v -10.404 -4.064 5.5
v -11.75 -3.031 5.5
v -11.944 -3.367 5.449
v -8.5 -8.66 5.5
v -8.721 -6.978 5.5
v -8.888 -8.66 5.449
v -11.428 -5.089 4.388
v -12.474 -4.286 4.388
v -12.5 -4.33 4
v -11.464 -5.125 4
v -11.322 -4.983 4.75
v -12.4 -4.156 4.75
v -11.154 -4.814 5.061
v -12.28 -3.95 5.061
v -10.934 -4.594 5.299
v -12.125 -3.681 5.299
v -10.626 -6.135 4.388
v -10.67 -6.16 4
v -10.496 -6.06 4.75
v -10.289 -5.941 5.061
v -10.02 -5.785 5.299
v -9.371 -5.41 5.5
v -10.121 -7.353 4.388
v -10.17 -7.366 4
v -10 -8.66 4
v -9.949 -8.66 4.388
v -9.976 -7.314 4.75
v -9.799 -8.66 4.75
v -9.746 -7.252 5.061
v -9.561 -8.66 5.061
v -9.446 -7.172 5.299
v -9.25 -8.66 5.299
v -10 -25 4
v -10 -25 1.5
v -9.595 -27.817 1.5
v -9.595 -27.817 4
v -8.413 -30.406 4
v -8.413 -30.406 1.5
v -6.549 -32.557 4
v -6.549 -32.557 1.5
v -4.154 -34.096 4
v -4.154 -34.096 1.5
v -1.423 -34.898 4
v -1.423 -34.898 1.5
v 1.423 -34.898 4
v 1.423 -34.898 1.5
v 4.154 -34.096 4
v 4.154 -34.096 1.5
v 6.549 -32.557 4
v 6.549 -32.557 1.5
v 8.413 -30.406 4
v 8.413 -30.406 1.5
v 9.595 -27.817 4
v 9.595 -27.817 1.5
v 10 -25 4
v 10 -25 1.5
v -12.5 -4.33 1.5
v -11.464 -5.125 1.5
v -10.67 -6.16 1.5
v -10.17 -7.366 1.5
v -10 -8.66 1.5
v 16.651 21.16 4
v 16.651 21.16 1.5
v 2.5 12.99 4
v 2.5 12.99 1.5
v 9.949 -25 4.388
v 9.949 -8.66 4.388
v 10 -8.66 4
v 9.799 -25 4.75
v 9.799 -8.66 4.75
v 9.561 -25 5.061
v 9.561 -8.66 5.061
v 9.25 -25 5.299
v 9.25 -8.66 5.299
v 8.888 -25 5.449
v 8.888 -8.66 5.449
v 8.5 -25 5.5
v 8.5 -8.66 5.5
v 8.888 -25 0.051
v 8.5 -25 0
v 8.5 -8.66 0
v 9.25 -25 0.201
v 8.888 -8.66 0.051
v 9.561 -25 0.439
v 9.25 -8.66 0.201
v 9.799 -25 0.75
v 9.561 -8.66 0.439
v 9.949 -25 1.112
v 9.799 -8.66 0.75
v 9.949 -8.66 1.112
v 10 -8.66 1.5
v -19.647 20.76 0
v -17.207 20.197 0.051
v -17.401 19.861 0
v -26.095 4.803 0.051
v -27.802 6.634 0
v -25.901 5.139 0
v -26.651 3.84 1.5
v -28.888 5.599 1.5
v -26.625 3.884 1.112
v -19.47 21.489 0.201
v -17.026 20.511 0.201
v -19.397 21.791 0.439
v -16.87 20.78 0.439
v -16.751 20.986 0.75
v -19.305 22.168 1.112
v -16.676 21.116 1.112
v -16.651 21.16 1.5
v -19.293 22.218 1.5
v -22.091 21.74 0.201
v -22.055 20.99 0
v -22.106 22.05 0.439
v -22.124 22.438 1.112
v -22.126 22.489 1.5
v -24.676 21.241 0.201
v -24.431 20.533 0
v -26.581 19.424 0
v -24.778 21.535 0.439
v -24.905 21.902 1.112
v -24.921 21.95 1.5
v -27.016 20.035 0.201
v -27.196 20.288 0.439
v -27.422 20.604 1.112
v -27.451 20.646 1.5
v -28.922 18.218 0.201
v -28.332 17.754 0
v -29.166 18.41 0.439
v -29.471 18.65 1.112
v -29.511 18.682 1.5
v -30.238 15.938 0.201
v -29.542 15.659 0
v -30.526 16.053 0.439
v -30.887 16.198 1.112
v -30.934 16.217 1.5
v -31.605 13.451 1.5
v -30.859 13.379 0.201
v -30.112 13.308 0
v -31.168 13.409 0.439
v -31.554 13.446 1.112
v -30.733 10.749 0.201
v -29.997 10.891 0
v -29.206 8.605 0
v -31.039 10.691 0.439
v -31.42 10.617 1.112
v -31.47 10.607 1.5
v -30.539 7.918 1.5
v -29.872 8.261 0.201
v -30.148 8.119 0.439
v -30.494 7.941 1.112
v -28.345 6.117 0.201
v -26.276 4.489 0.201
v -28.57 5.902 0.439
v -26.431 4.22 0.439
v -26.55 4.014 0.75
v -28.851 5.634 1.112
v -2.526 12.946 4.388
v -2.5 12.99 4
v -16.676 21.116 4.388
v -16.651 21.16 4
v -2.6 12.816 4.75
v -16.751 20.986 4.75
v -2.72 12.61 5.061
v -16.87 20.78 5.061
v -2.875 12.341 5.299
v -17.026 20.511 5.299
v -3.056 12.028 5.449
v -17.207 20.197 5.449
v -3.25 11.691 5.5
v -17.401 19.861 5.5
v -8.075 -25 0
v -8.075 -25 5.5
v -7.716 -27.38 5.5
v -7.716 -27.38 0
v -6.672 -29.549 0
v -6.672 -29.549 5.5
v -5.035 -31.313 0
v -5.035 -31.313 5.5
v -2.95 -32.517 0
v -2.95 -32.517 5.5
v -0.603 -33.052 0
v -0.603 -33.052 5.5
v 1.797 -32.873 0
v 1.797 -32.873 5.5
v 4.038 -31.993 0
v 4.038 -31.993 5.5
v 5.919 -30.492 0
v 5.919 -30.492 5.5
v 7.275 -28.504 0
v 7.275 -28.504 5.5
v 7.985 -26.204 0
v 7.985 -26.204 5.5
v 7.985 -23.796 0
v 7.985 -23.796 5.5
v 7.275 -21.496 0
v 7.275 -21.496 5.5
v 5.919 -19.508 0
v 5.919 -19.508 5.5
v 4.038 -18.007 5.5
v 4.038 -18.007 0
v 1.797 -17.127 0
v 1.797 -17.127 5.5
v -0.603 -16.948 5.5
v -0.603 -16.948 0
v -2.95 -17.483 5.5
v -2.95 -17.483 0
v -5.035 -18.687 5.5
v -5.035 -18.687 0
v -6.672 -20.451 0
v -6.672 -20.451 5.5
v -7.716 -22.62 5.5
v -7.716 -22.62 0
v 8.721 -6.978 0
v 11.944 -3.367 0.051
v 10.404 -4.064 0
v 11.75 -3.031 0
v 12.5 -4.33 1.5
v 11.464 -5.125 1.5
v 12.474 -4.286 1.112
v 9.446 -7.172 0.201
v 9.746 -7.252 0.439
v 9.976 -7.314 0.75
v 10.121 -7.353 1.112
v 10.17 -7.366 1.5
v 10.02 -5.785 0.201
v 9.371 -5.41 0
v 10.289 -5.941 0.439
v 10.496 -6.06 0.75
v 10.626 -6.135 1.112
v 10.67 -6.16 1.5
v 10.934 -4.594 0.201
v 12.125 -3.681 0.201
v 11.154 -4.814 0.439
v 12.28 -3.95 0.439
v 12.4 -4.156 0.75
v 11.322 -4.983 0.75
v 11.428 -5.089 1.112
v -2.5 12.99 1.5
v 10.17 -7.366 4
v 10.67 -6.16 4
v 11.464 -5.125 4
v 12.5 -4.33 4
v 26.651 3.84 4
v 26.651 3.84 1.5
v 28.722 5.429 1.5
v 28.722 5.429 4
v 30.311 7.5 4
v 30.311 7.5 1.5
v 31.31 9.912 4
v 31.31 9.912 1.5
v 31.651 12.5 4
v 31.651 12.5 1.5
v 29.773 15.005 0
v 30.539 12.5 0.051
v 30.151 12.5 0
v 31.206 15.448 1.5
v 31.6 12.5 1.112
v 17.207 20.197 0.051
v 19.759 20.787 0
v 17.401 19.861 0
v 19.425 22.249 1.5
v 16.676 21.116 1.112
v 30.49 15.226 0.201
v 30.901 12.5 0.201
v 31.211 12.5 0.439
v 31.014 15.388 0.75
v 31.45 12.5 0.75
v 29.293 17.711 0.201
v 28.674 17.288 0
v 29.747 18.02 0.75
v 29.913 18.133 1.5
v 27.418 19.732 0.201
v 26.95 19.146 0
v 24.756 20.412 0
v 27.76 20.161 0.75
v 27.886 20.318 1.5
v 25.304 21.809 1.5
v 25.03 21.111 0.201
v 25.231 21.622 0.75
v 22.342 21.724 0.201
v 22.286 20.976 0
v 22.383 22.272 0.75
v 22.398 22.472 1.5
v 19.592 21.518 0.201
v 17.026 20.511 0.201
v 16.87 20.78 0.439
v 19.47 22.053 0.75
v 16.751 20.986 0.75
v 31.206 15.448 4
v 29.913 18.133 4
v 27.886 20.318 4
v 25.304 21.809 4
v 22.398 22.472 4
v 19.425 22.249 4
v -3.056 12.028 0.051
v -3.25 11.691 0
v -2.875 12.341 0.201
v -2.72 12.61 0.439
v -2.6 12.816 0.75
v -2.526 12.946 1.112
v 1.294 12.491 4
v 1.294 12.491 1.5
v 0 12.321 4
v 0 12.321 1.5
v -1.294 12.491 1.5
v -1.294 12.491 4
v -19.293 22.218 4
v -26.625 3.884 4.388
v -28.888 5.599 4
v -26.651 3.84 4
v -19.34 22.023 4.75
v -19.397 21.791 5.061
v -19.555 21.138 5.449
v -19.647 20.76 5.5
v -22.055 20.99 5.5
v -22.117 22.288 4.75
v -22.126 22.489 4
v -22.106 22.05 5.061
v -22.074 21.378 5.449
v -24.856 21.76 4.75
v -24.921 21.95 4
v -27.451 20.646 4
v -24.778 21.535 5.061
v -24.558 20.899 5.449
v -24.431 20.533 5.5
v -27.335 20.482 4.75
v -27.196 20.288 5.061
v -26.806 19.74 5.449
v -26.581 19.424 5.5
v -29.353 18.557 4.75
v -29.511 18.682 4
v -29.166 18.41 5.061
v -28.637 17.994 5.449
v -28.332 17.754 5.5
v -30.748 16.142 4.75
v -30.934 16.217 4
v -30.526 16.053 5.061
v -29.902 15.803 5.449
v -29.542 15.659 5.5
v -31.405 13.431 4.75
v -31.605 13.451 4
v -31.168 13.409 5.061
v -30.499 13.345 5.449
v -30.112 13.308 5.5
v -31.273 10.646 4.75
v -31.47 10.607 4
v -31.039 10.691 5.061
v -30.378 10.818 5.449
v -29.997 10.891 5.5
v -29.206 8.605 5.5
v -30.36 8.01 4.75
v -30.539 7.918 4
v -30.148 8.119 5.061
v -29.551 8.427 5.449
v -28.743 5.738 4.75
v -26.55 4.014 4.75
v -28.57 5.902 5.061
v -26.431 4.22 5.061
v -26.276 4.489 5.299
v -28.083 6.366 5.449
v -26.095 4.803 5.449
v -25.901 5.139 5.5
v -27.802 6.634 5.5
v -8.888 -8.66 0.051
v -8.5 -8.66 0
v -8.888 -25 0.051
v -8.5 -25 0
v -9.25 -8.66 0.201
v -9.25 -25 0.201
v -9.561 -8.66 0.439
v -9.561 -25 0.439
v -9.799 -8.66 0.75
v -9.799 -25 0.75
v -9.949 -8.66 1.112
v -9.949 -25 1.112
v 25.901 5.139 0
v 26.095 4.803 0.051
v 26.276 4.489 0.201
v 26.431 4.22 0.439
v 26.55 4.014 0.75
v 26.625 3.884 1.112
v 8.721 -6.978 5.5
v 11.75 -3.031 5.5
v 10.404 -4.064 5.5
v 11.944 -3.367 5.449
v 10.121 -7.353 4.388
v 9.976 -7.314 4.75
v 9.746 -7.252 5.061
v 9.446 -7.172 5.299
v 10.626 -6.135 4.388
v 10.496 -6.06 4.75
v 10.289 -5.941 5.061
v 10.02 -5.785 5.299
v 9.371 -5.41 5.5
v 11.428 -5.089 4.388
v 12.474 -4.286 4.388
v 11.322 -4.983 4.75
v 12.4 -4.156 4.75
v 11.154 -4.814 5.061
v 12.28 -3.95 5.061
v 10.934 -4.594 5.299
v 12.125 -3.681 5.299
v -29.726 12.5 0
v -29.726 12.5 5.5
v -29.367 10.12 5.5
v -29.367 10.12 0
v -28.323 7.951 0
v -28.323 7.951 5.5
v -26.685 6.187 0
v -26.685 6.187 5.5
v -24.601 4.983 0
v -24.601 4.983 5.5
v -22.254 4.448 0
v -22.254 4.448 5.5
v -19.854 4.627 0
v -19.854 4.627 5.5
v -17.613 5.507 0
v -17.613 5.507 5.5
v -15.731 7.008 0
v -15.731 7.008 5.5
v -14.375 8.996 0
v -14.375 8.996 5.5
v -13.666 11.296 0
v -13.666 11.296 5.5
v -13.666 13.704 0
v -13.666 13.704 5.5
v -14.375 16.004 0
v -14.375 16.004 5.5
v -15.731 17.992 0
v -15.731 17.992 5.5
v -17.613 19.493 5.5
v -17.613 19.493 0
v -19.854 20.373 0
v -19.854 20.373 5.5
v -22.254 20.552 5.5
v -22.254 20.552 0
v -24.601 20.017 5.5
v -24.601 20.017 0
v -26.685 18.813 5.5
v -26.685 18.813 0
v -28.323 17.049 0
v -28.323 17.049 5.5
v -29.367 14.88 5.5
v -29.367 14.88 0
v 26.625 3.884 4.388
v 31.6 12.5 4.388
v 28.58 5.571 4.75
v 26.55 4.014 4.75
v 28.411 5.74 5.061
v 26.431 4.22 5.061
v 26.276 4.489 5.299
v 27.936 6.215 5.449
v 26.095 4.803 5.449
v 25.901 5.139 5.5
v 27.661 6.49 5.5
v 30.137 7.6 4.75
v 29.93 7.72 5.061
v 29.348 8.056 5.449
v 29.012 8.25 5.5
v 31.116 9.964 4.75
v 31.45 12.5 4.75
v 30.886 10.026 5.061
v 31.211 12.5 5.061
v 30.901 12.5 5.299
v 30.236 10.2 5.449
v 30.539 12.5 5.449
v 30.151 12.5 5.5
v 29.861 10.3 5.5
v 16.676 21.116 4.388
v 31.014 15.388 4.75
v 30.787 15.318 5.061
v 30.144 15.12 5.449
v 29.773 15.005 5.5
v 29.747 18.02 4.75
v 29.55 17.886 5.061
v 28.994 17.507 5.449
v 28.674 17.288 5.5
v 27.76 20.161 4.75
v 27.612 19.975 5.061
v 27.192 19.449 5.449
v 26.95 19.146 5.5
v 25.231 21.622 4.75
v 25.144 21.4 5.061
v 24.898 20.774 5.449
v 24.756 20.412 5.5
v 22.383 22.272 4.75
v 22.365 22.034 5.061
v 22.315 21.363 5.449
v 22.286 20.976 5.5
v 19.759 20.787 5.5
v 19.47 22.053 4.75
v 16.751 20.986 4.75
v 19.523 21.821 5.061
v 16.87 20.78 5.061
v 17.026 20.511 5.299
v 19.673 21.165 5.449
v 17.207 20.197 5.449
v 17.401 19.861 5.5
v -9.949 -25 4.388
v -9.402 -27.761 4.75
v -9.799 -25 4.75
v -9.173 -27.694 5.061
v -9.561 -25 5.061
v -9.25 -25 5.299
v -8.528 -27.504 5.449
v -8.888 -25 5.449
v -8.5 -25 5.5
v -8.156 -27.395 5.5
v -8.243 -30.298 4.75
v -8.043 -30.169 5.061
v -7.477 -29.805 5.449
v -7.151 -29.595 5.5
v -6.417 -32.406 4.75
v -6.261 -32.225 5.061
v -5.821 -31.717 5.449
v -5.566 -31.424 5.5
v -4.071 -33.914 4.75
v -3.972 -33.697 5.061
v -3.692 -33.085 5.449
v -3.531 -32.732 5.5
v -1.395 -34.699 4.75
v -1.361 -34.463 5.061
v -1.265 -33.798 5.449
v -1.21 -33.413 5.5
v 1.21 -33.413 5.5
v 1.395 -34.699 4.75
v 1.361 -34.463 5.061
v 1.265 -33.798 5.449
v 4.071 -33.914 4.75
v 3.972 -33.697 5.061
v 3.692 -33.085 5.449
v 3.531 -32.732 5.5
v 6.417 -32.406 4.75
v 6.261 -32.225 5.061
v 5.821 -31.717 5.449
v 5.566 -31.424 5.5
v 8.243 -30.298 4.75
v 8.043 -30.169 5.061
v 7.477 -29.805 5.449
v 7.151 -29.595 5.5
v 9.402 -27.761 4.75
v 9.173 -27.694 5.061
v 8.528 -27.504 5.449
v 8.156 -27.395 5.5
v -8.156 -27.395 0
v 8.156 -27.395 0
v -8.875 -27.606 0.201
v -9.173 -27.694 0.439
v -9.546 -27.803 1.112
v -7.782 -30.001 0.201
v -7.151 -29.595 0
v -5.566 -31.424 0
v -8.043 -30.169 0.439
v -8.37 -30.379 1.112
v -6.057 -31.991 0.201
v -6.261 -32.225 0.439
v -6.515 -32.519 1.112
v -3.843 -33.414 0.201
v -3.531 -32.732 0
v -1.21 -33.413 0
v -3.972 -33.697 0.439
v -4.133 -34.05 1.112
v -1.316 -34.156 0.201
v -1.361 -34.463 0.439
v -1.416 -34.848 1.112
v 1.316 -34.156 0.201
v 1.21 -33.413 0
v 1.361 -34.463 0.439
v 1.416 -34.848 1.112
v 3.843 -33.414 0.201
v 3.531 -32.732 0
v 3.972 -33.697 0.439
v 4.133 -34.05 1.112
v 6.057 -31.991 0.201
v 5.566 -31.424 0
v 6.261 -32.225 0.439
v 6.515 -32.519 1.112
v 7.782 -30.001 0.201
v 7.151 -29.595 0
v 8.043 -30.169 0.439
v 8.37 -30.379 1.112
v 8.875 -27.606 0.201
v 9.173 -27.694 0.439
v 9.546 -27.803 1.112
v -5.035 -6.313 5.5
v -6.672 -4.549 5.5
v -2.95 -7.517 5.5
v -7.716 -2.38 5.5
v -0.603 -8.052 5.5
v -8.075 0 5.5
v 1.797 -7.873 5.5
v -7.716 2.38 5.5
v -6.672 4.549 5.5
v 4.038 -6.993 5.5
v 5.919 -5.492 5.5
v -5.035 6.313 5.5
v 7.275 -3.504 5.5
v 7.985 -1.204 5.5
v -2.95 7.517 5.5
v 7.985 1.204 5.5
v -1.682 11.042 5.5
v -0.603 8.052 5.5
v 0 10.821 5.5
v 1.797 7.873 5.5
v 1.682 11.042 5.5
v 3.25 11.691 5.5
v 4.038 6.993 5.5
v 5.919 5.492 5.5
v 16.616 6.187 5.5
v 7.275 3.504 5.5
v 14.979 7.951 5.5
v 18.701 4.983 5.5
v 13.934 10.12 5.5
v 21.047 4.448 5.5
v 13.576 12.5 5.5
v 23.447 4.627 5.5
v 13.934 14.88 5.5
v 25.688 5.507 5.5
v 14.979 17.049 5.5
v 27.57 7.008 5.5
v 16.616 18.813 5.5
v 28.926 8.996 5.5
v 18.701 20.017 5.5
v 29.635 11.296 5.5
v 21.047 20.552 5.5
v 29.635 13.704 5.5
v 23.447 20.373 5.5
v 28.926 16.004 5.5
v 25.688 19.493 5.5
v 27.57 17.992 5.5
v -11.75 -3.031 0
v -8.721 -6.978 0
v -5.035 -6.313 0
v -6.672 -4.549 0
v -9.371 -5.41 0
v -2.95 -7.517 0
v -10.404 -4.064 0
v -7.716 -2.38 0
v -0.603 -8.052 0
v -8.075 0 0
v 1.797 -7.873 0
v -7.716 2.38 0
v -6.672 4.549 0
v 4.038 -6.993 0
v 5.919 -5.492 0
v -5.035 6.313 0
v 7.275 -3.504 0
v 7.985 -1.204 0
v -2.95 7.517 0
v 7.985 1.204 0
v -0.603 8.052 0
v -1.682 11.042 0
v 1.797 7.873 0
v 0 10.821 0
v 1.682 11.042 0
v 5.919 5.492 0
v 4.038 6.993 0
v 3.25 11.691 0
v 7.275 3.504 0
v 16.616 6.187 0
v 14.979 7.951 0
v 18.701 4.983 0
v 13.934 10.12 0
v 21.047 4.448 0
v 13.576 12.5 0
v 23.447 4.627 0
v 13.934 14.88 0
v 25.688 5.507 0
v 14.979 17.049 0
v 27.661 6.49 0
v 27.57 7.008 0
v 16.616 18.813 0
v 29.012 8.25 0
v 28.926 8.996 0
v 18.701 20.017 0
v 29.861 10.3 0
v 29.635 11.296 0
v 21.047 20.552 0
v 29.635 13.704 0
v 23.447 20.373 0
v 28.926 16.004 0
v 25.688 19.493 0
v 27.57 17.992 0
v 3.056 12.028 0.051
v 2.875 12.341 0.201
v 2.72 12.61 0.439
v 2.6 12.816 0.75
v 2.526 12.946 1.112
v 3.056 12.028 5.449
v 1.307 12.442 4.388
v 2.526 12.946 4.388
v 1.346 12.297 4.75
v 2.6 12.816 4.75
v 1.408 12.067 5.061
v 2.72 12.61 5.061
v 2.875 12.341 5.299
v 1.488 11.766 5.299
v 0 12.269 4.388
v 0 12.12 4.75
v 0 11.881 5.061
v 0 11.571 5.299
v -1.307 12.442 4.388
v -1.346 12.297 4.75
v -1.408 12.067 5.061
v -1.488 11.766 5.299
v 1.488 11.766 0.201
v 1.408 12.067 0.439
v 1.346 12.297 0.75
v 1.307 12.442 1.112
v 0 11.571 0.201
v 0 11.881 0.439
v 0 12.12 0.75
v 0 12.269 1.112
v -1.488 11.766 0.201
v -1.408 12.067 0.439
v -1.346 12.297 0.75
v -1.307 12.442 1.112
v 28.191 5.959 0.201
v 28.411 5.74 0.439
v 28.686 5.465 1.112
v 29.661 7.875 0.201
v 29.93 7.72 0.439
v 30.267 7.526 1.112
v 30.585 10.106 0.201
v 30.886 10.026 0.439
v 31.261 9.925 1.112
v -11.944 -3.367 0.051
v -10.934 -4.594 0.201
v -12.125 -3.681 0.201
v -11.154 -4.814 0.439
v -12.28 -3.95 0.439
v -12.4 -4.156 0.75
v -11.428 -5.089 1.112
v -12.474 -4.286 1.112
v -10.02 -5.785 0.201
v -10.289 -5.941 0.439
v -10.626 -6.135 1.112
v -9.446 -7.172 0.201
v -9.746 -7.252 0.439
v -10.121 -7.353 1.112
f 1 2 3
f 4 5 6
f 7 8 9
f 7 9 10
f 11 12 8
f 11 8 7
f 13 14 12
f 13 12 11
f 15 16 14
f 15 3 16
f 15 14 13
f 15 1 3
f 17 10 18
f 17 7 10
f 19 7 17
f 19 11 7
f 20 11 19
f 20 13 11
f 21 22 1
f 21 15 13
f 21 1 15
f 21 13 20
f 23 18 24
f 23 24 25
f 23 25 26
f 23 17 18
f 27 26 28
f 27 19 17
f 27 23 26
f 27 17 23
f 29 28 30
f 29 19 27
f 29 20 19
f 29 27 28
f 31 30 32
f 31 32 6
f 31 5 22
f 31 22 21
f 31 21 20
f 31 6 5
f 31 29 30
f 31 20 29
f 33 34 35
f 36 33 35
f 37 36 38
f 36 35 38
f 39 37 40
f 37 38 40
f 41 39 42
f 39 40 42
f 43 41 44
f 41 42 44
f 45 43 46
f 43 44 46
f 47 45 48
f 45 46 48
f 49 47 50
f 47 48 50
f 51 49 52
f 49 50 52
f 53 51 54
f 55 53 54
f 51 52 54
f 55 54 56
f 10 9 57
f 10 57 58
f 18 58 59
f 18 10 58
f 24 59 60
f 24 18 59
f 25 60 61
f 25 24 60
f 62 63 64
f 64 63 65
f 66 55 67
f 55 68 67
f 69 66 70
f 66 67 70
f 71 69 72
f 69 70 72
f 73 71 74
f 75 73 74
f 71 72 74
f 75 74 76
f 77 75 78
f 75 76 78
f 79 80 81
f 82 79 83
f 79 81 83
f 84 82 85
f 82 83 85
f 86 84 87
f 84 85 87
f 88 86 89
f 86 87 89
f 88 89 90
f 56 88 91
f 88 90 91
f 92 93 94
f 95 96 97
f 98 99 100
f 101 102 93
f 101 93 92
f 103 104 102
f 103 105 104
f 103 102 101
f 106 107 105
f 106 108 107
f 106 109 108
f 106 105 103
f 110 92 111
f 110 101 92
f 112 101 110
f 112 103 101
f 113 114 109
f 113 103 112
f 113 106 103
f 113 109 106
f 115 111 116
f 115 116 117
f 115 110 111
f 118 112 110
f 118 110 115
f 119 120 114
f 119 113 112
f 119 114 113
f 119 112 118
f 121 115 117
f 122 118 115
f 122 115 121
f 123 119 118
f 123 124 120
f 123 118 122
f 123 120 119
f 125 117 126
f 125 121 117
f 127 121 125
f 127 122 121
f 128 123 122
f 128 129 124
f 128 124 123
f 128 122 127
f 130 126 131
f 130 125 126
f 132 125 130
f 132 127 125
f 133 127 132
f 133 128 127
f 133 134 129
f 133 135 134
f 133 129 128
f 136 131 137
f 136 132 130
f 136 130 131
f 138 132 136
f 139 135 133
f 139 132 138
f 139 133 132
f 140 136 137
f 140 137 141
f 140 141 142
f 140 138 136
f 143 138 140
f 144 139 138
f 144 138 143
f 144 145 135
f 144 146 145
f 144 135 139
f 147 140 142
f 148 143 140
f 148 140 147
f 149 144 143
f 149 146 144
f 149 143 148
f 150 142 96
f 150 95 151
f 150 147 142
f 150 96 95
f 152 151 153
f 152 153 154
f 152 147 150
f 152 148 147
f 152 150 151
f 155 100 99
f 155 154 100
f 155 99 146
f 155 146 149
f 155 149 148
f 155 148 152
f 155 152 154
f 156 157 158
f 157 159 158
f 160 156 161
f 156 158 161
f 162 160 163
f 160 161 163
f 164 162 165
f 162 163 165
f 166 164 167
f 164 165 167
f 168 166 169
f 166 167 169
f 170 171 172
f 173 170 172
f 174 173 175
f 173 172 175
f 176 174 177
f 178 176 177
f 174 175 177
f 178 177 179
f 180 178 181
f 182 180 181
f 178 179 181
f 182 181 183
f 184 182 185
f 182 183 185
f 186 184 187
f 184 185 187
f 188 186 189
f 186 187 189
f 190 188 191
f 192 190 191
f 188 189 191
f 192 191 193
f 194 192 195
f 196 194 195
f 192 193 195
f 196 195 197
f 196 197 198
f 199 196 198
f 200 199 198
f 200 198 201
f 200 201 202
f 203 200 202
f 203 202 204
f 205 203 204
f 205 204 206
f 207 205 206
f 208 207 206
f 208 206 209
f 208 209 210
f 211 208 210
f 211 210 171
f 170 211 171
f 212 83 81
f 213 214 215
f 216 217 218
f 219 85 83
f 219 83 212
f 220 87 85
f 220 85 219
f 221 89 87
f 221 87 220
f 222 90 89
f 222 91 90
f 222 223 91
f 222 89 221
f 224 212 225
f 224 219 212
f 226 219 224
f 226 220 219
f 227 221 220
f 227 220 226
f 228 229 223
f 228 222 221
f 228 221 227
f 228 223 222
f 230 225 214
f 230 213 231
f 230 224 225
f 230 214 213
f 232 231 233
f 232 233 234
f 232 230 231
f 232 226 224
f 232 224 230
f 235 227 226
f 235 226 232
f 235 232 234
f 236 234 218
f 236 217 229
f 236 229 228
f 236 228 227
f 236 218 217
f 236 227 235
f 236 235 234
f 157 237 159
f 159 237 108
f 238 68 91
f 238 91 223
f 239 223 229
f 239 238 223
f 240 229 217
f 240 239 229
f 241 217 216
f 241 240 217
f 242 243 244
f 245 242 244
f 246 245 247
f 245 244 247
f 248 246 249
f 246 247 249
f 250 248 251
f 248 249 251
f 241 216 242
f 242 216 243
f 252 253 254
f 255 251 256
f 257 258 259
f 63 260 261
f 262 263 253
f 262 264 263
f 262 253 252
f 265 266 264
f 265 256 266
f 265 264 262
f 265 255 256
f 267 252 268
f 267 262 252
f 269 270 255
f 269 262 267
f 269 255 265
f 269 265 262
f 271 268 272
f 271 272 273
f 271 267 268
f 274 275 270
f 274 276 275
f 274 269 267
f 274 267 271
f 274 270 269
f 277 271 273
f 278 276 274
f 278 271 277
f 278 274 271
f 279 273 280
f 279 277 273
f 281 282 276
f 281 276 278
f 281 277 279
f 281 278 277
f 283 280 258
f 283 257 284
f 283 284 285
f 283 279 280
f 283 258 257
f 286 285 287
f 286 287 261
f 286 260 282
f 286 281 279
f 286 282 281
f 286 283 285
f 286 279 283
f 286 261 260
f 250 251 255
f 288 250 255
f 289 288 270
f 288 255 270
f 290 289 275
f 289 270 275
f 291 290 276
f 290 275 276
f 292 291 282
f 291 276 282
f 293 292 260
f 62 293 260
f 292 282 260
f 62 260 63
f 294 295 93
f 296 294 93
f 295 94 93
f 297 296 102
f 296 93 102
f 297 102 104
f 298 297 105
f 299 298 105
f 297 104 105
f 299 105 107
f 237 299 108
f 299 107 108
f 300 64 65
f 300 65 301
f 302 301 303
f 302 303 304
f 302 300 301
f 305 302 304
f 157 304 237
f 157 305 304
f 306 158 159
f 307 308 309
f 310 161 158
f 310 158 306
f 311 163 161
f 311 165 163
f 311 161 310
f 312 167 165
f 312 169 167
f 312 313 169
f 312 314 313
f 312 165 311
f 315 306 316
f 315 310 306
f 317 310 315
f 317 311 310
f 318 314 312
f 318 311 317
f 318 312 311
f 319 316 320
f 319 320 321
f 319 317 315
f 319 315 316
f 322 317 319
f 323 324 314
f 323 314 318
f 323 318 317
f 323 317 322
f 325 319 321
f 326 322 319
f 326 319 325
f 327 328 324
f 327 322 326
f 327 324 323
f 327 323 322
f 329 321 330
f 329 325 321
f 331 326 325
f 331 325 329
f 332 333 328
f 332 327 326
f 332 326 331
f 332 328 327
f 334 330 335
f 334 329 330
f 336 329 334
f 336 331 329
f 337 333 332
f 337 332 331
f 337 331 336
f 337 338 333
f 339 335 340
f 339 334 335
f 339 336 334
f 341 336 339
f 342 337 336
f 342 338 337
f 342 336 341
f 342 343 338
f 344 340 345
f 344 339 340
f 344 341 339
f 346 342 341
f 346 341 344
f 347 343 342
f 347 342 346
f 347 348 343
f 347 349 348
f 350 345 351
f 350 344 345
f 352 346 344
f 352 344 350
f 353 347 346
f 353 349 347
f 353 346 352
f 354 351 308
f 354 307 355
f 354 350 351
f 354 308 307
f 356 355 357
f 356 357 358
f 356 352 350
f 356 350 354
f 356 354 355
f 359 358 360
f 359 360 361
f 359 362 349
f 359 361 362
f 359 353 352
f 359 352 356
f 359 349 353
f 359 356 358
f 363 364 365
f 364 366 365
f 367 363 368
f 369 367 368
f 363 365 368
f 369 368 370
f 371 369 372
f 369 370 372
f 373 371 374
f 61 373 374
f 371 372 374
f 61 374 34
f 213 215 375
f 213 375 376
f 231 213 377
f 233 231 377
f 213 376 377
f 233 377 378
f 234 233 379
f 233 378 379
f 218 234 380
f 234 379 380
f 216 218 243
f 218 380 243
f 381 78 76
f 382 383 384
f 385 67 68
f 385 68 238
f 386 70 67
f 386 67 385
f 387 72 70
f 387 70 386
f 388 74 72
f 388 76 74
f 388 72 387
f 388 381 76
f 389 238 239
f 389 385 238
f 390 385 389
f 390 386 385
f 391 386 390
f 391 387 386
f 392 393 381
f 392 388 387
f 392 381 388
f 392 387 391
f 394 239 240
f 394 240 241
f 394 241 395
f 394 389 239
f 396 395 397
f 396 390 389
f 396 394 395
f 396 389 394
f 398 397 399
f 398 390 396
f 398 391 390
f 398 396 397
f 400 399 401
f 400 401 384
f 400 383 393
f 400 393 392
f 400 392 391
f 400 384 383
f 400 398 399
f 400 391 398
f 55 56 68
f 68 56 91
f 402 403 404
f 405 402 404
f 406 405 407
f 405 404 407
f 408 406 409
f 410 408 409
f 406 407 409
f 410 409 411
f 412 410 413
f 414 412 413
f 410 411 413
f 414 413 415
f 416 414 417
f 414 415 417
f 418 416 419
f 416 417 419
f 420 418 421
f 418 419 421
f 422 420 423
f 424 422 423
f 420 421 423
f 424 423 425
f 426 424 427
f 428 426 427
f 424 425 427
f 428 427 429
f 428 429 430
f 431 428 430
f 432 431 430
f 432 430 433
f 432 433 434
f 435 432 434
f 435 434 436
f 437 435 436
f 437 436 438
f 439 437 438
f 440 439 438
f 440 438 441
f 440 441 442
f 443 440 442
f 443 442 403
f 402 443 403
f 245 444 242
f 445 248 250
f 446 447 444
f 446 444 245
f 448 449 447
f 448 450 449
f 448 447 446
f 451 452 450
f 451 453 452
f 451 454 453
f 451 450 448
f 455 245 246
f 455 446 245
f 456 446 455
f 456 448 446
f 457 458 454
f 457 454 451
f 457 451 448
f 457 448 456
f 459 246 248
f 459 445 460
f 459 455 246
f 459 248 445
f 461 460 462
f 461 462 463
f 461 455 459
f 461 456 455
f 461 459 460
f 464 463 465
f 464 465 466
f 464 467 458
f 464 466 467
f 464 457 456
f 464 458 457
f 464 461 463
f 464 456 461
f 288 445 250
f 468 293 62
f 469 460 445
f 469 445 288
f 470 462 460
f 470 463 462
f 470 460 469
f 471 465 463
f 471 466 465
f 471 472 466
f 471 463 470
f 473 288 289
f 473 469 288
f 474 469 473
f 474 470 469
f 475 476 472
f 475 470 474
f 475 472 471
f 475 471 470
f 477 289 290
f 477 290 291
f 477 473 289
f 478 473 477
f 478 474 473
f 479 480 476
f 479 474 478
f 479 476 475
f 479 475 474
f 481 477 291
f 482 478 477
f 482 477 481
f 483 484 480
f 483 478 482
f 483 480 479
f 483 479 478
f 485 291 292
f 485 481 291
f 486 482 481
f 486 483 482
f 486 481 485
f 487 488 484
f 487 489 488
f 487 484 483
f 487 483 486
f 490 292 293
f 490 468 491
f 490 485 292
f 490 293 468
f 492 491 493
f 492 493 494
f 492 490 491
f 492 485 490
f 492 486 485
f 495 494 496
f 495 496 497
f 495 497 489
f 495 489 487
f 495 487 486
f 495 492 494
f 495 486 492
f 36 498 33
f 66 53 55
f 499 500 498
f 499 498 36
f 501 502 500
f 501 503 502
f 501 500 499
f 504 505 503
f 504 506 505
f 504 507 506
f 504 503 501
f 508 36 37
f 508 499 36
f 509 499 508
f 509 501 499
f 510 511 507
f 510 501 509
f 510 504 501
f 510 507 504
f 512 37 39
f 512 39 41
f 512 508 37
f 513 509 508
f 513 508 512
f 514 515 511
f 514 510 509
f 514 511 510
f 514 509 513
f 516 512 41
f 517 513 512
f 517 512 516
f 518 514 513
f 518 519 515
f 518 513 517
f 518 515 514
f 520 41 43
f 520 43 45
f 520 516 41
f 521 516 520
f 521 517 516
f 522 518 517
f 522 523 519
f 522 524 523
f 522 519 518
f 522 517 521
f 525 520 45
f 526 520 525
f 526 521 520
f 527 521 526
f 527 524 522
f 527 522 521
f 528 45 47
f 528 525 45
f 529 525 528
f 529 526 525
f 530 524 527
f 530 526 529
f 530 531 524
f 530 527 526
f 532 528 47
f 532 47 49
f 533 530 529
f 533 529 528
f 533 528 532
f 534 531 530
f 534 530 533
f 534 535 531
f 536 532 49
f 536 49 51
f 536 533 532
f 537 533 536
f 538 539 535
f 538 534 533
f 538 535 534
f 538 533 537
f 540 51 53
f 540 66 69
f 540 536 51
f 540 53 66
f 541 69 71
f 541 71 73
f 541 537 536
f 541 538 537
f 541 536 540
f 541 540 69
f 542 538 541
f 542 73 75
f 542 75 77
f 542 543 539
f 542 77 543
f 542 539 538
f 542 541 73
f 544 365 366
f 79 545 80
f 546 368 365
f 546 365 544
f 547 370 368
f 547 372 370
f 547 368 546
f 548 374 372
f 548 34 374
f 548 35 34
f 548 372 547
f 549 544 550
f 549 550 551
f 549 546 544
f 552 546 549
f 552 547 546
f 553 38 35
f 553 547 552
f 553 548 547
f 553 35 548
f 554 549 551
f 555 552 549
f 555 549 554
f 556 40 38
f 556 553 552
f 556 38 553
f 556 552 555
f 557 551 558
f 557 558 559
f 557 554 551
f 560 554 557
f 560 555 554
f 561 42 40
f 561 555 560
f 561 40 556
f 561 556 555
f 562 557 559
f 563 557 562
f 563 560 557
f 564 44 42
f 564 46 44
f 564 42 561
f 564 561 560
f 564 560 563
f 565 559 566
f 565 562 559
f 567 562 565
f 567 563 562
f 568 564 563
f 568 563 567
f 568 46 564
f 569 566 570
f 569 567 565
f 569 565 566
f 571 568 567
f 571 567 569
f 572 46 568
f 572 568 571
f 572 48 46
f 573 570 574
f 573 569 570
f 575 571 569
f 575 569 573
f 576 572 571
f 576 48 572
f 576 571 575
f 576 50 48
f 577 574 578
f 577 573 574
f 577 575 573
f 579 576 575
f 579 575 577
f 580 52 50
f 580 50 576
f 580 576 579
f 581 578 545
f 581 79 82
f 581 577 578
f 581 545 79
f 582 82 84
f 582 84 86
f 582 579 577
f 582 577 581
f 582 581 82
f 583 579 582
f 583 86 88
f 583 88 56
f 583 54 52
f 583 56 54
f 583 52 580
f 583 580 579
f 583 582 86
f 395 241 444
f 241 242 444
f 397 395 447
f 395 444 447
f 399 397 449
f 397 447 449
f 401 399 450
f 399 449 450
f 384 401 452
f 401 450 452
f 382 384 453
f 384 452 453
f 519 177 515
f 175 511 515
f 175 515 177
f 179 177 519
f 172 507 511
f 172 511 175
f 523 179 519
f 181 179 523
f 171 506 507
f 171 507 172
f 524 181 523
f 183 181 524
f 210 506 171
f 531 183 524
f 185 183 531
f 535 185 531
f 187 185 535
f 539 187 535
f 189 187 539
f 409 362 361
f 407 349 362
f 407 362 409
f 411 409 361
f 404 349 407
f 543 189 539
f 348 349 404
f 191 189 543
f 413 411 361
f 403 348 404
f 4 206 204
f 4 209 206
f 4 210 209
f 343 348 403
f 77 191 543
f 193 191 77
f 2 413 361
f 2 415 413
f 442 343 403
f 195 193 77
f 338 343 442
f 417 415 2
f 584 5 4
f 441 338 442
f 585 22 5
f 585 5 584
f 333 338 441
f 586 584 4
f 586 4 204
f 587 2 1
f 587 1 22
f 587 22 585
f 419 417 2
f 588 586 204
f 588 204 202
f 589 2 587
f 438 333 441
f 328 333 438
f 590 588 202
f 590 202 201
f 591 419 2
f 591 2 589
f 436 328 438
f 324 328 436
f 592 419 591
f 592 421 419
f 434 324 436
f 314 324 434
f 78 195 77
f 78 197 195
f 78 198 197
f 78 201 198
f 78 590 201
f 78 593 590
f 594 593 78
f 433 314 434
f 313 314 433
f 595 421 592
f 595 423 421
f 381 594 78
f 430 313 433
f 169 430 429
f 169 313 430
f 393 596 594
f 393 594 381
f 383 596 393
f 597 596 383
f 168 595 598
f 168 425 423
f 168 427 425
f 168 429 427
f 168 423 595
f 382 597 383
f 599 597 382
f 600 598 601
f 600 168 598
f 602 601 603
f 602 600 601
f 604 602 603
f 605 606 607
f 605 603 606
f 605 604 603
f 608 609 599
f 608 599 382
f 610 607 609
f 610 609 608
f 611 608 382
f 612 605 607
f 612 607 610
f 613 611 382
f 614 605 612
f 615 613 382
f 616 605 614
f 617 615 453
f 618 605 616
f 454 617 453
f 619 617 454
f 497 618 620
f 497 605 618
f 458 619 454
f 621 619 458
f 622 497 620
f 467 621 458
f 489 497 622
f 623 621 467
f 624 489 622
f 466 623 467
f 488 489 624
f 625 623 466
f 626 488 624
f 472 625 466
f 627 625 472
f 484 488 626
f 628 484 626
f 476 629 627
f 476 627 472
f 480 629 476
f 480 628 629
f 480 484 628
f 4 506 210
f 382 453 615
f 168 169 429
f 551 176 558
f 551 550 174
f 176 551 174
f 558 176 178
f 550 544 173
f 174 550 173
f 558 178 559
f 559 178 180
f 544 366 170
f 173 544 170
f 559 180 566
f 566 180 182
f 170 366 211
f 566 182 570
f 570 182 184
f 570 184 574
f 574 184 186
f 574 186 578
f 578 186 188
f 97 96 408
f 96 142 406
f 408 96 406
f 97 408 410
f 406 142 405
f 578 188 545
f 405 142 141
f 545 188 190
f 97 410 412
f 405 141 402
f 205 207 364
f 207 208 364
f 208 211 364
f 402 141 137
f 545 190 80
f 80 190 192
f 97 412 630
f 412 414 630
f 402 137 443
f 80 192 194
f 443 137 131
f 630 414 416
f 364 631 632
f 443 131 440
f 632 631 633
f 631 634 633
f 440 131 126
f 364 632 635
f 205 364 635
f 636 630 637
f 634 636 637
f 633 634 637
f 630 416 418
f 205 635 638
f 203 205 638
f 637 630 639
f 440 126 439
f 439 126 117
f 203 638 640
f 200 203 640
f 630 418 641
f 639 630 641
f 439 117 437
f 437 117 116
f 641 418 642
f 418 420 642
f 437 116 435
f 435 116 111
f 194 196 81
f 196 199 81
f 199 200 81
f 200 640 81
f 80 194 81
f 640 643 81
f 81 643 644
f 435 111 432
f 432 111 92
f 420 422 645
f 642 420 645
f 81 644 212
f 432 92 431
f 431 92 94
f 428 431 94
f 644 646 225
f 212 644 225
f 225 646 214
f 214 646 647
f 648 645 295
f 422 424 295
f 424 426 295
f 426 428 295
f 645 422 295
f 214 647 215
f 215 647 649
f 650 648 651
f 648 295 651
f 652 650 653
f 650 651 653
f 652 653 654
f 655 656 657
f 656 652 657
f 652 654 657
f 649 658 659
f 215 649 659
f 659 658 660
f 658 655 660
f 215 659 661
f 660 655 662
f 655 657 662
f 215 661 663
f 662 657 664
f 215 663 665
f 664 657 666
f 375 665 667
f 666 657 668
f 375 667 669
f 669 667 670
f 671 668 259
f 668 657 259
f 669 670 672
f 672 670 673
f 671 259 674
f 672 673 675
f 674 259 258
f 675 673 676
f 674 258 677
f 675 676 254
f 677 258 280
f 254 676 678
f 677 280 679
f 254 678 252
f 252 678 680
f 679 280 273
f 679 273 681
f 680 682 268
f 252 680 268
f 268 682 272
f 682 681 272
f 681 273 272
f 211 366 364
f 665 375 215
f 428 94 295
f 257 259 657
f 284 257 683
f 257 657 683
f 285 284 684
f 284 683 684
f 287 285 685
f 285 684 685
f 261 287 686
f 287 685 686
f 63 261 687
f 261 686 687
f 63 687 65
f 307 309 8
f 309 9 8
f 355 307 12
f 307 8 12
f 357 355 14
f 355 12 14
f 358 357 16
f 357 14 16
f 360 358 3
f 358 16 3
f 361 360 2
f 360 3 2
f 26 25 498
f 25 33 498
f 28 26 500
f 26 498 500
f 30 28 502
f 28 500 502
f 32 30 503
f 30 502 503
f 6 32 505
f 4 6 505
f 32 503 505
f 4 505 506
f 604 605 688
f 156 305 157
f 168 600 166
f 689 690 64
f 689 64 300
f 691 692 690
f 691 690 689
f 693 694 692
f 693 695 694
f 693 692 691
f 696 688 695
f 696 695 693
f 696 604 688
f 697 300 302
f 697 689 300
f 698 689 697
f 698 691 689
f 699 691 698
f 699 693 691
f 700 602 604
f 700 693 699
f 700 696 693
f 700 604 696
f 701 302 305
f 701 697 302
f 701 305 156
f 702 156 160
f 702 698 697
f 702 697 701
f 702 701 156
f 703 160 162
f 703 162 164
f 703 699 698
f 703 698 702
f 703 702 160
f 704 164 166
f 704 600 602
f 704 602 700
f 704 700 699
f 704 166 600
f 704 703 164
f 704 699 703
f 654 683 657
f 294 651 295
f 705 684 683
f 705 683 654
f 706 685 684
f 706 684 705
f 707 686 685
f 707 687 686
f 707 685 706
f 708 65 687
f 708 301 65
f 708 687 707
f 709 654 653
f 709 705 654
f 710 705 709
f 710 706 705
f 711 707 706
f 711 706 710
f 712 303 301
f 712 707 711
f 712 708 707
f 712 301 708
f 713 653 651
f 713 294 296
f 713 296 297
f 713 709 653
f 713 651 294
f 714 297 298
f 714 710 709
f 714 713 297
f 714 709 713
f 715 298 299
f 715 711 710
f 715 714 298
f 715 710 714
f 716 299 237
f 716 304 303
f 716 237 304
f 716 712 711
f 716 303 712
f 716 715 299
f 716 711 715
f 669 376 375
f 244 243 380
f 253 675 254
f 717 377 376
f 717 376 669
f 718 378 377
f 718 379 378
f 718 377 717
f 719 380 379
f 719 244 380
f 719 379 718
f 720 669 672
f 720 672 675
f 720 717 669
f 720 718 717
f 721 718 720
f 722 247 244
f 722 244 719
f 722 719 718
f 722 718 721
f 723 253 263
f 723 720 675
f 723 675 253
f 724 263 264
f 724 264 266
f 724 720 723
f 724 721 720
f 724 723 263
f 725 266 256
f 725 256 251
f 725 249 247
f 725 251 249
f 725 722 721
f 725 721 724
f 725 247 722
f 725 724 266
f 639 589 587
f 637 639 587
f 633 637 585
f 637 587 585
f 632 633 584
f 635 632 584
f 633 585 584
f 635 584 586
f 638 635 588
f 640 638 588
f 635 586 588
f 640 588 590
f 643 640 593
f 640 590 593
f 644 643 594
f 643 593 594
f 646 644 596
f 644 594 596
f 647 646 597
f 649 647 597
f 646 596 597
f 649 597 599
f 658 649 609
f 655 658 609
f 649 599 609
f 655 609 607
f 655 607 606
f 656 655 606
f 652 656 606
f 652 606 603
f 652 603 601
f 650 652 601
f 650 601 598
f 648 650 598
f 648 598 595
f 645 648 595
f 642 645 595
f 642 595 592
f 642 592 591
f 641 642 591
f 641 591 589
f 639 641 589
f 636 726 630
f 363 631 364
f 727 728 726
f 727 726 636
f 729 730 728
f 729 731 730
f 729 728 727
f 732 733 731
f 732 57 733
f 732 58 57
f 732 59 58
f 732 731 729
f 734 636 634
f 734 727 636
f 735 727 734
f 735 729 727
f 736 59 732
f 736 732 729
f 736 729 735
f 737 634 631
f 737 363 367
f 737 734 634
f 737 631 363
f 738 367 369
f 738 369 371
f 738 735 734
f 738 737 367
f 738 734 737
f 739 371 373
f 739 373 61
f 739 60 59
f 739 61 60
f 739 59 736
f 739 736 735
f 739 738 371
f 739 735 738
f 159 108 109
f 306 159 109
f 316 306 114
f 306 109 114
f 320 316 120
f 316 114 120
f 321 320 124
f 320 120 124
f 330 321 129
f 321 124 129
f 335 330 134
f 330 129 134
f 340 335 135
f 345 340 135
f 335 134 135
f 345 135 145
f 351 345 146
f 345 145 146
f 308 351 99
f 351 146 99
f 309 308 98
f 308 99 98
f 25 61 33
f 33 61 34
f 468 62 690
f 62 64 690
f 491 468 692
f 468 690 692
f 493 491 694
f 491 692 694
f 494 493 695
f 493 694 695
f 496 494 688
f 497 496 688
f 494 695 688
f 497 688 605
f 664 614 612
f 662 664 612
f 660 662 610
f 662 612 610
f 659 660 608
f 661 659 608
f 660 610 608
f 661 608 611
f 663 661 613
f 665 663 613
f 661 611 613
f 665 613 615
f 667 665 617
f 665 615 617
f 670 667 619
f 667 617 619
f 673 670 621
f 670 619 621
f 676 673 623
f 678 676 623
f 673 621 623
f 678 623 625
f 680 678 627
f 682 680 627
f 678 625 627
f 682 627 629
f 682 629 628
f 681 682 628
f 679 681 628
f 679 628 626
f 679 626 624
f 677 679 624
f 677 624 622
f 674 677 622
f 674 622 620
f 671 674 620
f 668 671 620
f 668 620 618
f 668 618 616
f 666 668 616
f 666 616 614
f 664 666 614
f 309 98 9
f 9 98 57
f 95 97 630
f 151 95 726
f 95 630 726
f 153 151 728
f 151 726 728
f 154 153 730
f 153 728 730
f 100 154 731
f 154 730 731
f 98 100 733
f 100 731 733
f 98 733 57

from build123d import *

# Parameters (mm, degrees)
F2_DEPTH = 5.5
F3_R     = 5
F4_D     = 16.15
F5_R     = 1.5


with BuildPart() as f2:
    # F1 (on Top) → F2 (new body)
    with BuildSketch(Plane.XY):
        with BuildLine():
            ThreePointArc((-26.6506350946, 3.8397459622), (-16.6506350946, 3.8397459622), (-11.6506350946, 12.5))
            ThreePointArc((-11.6506350946, 12.5), (-12.9903810568, 17.5), (-16.6506350946, 21.1602540378))
            ThreePointArc((-16.6506350946, 21.1602540378), (-30.3108891325, 17.5), (-26.6506350946, 3.8397459622))
        make_face()
        with BuildLine():
            ThreePointArc((-16.6506350946, 21.1602540378), (-12.9903810568, 17.5), (-11.6506350946, 12.5))
            ThreePointArc((-11.6506350946, 12.5), (-16.6506350946, 3.8397459622), (-26.6506350946, 3.8397459622))
            Line((-26.6506350946, 3.8397459622), (-10, -5.7735026919))
            Line((-10, -5.7735026919), (-10, -25))
            ThreePointArc((-10, -25), (0, -15), (10, -25))
            Line((10, -25), (10, -5.7735026919))
            Line((10, -5.7735026919), (26.6506350946, 3.8397459622))
            ThreePointArc((26.6506350946, 3.8397459622), (12.9903810568, 7.5), (16.6506350946, 21.1602540378))
            Line((16.6506350946, 21.1602540378), (0, 11.5470053838))
            Line((0, 11.5470053838), (-16.6506350946, 21.1602540378))
        make_face()
        with BuildLine():
            ThreePointArc((31.6506350946, 12.5), (26.6506350946, 21.1602540378), (16.6506350946, 21.1602540378))
            ThreePointArc((16.6506350946, 21.1602540378), (12.9903810568, 7.5), (26.6506350946, 3.8397459622))
            ThreePointArc((26.6506350946, 3.8397459622), (30.3108891325, 7.5), (31.6506350946, 12.5))
        make_face()
        with BuildLine():
            ThreePointArc((10, -25), (0, -15), (-10, -25))
            ThreePointArc((-10, -25), (0, -35), (10, -25))
        make_face()
    extrude(amount=F2_DEPTH)

    # F3
    f3_edges = [f2.edges().sort_by_distance(p)[0] for p in [
        (-10, -5.773503, 2.75),
        (10, -5.773503, 2.75),
        (0, 11.547005, 2.75),
    ]]
    fillet(f3_edges, radius=F3_R)

    # F4 (through all)
    with Locations(Plane(origin=(0, 0, 0), x_dir=(1, 0, 0), z_dir=(0, 0, -1))):
        with Locations((0, 25), (-21.6506350946, -12.5), (21.6506350946, -12.5), (0, 0)):
            Hole(F4_D / 2)

    # F5
    f5_edges = [f2.edges().sort_by_distance(p)[0] for p in [
        (-19.575318, -0.245191, 5.5),
        (-10, -16.830127, 0),
    ]]
    fillet(f5_edges, radius=F5_R)


solid = f2.part
